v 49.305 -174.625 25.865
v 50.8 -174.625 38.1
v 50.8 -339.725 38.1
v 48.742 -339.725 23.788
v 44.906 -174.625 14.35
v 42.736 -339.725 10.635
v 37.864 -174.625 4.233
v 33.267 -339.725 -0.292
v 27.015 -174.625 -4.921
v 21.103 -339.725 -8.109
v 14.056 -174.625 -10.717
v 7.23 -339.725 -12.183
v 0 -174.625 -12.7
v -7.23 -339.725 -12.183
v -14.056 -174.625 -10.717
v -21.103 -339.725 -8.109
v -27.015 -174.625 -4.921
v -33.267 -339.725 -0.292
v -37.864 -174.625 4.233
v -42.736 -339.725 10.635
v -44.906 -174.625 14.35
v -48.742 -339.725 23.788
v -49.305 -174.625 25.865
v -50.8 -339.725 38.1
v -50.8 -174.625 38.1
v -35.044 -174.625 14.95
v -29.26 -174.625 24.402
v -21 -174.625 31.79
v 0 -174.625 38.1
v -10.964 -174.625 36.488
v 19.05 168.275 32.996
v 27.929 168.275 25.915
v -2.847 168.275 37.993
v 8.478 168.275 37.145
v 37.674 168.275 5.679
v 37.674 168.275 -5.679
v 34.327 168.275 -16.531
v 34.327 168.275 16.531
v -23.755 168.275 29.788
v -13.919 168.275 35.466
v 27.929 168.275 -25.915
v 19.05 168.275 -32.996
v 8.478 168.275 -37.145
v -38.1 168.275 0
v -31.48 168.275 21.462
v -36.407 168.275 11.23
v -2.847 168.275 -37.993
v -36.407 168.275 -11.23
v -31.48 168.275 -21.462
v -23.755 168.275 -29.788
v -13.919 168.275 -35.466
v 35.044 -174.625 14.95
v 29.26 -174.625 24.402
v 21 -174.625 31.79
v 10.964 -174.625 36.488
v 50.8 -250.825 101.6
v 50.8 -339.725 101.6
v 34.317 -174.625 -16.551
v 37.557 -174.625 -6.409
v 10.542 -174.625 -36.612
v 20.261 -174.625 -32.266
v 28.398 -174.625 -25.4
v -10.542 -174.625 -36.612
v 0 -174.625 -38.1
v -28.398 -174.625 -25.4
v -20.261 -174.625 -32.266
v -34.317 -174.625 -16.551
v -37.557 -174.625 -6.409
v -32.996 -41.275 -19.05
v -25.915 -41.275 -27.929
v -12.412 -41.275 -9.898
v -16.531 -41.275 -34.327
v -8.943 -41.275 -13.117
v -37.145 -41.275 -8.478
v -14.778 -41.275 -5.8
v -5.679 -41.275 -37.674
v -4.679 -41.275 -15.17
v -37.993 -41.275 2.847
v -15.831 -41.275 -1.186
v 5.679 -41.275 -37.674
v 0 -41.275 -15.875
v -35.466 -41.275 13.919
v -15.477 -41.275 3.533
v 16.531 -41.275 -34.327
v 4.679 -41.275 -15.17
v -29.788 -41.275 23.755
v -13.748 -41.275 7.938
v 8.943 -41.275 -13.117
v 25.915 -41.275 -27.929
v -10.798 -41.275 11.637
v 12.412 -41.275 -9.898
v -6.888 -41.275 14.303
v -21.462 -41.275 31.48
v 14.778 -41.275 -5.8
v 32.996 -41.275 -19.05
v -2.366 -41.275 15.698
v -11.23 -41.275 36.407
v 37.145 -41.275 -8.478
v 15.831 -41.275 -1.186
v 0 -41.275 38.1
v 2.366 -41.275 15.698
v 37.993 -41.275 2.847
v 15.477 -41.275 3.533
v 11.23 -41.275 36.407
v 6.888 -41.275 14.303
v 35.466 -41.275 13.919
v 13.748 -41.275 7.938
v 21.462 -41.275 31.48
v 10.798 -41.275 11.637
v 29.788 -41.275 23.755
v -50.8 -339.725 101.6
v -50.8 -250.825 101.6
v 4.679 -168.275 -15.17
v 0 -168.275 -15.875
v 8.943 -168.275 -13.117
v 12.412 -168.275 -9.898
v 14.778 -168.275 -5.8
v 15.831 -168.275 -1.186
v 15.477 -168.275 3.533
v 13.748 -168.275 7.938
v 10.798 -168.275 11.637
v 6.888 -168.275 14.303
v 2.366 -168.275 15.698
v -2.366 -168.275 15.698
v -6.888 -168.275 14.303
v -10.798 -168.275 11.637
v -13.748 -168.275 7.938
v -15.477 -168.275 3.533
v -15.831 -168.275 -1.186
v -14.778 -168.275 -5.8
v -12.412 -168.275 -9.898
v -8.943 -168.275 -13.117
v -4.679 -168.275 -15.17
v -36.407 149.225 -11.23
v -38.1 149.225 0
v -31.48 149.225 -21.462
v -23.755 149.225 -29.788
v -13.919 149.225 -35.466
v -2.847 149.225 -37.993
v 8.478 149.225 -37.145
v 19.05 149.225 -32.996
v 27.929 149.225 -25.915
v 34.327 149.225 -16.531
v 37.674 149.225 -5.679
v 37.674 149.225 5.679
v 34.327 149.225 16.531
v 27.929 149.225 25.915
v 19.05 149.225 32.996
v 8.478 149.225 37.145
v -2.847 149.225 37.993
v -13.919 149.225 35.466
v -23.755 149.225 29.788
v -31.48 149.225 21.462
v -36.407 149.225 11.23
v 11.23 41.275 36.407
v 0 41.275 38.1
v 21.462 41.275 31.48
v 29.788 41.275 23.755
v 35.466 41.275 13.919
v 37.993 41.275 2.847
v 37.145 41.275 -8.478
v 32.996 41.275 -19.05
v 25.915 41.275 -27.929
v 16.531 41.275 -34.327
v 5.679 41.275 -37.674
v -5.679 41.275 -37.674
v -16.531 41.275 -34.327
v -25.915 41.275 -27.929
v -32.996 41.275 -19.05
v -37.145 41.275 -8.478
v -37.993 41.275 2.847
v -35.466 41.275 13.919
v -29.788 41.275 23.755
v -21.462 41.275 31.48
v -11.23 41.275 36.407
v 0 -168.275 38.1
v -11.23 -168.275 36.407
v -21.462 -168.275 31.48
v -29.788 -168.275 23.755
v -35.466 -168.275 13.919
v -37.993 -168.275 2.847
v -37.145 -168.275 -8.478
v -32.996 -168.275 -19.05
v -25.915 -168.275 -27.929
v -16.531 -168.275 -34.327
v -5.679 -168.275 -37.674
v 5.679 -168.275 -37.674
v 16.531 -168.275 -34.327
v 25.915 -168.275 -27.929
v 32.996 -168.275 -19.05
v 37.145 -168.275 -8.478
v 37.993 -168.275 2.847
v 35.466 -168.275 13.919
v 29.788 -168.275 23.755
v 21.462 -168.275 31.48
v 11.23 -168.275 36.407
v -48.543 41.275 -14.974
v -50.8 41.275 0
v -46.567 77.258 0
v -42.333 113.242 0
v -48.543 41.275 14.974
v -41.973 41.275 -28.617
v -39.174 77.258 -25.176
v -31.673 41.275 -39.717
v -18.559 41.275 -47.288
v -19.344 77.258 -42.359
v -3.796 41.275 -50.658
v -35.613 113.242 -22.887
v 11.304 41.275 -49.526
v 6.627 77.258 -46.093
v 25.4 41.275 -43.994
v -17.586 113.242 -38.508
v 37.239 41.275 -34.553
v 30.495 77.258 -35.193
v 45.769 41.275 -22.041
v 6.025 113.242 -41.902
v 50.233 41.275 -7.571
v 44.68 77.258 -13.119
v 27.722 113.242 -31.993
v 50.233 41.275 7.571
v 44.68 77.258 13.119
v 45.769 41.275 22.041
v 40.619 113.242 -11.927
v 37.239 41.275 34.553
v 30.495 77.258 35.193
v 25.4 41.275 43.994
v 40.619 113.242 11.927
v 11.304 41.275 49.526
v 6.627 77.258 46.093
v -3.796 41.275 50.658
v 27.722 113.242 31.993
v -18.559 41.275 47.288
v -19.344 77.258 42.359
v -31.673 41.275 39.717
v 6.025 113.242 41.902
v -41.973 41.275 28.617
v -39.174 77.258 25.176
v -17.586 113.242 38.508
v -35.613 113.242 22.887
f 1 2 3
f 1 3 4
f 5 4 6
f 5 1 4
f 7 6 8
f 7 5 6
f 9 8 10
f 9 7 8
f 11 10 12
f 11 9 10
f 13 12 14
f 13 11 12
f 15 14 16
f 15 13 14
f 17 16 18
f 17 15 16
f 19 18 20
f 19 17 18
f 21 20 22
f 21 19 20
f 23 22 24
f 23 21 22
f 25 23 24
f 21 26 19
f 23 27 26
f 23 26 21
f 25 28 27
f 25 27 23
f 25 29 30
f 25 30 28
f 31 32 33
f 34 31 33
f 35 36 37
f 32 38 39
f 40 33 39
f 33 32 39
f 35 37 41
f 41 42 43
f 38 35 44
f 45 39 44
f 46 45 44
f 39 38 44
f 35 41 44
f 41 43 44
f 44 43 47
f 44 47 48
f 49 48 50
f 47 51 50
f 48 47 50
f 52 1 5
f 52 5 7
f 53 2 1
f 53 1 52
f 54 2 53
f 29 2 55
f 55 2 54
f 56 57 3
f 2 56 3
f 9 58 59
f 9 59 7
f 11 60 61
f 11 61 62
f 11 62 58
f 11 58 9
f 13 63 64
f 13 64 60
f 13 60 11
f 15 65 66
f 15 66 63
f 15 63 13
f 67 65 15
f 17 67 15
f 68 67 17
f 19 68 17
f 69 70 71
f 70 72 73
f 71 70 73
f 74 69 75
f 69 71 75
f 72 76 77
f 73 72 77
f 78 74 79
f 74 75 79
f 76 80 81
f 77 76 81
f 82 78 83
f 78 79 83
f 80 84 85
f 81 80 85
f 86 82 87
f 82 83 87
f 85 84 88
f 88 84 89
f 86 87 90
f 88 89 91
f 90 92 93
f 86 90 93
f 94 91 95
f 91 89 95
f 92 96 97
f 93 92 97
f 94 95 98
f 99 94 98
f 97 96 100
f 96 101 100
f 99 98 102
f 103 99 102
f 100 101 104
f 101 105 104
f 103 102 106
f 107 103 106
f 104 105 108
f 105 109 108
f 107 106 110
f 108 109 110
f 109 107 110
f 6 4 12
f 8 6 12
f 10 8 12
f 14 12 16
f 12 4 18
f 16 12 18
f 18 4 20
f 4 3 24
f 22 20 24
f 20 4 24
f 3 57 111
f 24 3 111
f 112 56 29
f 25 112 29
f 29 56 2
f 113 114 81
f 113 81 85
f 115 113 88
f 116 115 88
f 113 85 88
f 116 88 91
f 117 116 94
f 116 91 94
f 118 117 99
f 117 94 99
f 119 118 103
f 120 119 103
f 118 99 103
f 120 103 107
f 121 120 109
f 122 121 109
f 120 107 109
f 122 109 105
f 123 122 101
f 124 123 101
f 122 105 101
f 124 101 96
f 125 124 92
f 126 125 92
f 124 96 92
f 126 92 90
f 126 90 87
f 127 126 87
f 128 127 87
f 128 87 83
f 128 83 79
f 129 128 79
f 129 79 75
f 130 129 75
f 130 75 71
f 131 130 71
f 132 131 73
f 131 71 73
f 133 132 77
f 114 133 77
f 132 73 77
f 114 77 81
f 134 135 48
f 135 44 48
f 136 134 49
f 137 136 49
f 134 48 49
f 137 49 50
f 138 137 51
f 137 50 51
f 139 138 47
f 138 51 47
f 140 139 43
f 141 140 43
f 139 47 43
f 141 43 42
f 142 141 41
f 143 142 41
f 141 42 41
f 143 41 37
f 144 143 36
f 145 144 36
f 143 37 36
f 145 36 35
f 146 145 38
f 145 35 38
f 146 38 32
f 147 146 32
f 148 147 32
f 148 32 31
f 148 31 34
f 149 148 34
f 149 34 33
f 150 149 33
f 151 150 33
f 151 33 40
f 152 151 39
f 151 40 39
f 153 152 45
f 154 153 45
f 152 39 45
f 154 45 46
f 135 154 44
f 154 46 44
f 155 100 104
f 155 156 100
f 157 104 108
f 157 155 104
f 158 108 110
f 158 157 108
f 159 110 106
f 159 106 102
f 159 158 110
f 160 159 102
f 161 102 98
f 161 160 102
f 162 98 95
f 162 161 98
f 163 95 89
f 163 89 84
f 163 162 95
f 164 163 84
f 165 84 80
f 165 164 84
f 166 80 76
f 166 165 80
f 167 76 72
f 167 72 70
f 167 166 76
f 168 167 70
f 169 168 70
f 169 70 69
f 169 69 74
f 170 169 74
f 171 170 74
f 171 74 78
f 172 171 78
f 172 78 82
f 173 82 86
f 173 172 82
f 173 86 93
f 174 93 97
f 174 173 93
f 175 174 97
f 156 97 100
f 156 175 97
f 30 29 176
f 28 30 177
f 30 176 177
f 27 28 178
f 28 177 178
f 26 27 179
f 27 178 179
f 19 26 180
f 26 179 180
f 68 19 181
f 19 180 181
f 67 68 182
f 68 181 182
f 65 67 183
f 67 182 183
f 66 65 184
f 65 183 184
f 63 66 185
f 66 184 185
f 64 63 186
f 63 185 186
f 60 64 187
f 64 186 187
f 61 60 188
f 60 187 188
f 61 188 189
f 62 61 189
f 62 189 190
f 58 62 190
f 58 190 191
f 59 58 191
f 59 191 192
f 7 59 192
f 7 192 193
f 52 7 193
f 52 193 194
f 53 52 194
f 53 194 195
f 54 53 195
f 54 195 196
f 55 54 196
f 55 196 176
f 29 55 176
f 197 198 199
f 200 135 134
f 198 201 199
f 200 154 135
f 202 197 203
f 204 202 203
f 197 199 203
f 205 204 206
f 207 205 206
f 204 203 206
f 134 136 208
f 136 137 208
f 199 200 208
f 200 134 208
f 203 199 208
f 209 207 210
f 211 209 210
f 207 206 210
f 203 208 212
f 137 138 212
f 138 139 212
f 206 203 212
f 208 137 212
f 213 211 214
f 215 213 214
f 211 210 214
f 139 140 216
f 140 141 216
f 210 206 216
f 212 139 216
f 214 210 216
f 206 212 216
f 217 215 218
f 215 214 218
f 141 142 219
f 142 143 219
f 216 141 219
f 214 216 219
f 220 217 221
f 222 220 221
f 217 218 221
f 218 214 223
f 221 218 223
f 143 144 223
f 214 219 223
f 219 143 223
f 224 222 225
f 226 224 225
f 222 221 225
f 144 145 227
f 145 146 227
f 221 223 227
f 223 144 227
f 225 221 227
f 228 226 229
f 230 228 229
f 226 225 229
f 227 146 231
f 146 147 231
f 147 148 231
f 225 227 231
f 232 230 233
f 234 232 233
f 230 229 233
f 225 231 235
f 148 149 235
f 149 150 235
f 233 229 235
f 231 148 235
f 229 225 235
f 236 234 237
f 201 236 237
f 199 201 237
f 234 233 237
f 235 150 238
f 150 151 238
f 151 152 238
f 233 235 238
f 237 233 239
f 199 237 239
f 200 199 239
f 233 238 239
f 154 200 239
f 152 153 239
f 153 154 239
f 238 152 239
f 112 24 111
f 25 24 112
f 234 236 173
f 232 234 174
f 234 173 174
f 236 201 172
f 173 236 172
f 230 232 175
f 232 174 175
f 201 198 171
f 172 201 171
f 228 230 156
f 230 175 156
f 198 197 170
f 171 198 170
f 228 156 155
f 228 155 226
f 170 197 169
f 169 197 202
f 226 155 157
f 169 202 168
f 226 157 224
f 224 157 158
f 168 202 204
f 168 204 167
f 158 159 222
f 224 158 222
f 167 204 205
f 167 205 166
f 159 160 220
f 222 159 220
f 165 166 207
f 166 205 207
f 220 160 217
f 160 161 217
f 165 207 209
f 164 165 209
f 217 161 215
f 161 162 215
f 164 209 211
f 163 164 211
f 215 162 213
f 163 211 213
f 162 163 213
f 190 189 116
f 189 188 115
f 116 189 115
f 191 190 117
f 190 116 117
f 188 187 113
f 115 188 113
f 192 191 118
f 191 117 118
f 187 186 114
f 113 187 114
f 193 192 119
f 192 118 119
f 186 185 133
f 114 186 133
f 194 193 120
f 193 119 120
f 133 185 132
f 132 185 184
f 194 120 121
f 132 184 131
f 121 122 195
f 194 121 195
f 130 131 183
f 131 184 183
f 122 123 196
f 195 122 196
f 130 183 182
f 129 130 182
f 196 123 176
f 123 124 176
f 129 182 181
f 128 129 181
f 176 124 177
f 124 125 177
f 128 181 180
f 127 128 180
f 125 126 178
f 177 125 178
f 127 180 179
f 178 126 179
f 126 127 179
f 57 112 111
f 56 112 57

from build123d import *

# Parameters (mm, degrees)
SKETCH1_R           = 38.1
BOSS_EXTRUDE1_DEPTH = 41.275
SKETCH2_R           = 15.875
BOSS_EXTRUDE2_DEPTH = 127
SKETCH3_R           = 38.1
BOSS_EXTRUDE3_DEPTH = 6.35
BOSS_EXTRUDE4_DEPTH = 165.1
CUT_EXTRUDE1_REACH  = 370.861


with BuildPart() as part:
    # Sketch1 → Boss-Extrude1 (new, symmetric)
    with BuildSketch(Plane(origin=(0, 0, 0), x_dir=(1, 0, 0), z_dir=(0, 1, 0))):
        with Locations(Location((0, 0, 0), (0, 0, 270))):
            Circle(SKETCH1_R)
    extrude(amount=BOSS_EXTRUDE1_DEPTH, both=True)

    # Sketch2 → Boss-Extrude2 (add)
    with BuildSketch(Plane.XZ.offset(41.275)):
        with Locations(Location((0, 0, 0), (0, 0, 270))):
            Circle(SKETCH2_R)
    extrude(amount=BOSS_EXTRUDE2_DEPTH)

    # Sketch3 → Boss-Extrude3 (add)
    with BuildSketch(Plane.XZ.offset(168.275)):
        with Locations(Location((0, 0, 0), (0, 0, 90))):
            Circle(SKETCH3_R)
    extrude(amount=BOSS_EXTRUDE3_DEPTH)

    # Sketch4 → Boss-Extrude4 (add)
    with BuildSketch(Plane.XZ.offset(174.625)):
        with BuildLine():
            Line((-50.8, 38.1), (-50.8, 101.6))
            Line((-50.8, 101.6), (50.8, 101.6))
            Line((50.8, 101.6), (50.8, 38.1))
            ThreePointArc((50.8, 38.1), (0, -12.7), (-50.8, 38.1))
        make_face()
    extrude(amount=BOSS_EXTRUDE4_DEPTH)

    # Cut-Extrude1: up to this face of the body (flat: up to its plane)
    cut_extrude1_end = Plane(part.part.faces().sort_by_distance((-50.8, -257.175, 69.85))[0])
    # Sketch5 → Cut-Extrude1 (cut, up to the picked face)
    with BuildSketch(Plane(origin=(50.8, 0, 0), x_dir=(0, 0, -1), z_dir=(1, 0, 0)), mode=Mode.PRIVATE) as cut_extrude1_sk1:
        Polygon((-38.1, -174.625), (-101.6, -174.625), (-101.6, -250.825), align=None)
    cut_extrude1_tool1 = split(extrude(cut_extrude1_sk1.sketch, amount=-CUT_EXTRUDE1_REACH, mode=Mode.PRIVATE), bisect_by=cut_extrude1_end, keep=Keep.BOTH, mode=Mode.PRIVATE)
    add(cut_extrude1_tool1.solids().sort_by(Axis((50.8, -200.025, 80.433333), (-1, 0, 0)))[0], mode=Mode.SUBTRACT)

    # Sketch6 → Revolve1 (revolve)
    with BuildSketch(Plane.XY, mode=Mode.PRIVATE) as revolve1_sk:
        Polygon((0, 41.275), (50.8, 41.275), (38.1, 149.225), (38.1, 168.275), (0, 168.275), align=None)
    revolve(revolve1_sk.sketch.rotate(Axis((0, 168.275, 0), (0, -1, 0)), 180), axis=Axis((0, 168.275, 0), (0, -1, 0)))


solid = part.part
